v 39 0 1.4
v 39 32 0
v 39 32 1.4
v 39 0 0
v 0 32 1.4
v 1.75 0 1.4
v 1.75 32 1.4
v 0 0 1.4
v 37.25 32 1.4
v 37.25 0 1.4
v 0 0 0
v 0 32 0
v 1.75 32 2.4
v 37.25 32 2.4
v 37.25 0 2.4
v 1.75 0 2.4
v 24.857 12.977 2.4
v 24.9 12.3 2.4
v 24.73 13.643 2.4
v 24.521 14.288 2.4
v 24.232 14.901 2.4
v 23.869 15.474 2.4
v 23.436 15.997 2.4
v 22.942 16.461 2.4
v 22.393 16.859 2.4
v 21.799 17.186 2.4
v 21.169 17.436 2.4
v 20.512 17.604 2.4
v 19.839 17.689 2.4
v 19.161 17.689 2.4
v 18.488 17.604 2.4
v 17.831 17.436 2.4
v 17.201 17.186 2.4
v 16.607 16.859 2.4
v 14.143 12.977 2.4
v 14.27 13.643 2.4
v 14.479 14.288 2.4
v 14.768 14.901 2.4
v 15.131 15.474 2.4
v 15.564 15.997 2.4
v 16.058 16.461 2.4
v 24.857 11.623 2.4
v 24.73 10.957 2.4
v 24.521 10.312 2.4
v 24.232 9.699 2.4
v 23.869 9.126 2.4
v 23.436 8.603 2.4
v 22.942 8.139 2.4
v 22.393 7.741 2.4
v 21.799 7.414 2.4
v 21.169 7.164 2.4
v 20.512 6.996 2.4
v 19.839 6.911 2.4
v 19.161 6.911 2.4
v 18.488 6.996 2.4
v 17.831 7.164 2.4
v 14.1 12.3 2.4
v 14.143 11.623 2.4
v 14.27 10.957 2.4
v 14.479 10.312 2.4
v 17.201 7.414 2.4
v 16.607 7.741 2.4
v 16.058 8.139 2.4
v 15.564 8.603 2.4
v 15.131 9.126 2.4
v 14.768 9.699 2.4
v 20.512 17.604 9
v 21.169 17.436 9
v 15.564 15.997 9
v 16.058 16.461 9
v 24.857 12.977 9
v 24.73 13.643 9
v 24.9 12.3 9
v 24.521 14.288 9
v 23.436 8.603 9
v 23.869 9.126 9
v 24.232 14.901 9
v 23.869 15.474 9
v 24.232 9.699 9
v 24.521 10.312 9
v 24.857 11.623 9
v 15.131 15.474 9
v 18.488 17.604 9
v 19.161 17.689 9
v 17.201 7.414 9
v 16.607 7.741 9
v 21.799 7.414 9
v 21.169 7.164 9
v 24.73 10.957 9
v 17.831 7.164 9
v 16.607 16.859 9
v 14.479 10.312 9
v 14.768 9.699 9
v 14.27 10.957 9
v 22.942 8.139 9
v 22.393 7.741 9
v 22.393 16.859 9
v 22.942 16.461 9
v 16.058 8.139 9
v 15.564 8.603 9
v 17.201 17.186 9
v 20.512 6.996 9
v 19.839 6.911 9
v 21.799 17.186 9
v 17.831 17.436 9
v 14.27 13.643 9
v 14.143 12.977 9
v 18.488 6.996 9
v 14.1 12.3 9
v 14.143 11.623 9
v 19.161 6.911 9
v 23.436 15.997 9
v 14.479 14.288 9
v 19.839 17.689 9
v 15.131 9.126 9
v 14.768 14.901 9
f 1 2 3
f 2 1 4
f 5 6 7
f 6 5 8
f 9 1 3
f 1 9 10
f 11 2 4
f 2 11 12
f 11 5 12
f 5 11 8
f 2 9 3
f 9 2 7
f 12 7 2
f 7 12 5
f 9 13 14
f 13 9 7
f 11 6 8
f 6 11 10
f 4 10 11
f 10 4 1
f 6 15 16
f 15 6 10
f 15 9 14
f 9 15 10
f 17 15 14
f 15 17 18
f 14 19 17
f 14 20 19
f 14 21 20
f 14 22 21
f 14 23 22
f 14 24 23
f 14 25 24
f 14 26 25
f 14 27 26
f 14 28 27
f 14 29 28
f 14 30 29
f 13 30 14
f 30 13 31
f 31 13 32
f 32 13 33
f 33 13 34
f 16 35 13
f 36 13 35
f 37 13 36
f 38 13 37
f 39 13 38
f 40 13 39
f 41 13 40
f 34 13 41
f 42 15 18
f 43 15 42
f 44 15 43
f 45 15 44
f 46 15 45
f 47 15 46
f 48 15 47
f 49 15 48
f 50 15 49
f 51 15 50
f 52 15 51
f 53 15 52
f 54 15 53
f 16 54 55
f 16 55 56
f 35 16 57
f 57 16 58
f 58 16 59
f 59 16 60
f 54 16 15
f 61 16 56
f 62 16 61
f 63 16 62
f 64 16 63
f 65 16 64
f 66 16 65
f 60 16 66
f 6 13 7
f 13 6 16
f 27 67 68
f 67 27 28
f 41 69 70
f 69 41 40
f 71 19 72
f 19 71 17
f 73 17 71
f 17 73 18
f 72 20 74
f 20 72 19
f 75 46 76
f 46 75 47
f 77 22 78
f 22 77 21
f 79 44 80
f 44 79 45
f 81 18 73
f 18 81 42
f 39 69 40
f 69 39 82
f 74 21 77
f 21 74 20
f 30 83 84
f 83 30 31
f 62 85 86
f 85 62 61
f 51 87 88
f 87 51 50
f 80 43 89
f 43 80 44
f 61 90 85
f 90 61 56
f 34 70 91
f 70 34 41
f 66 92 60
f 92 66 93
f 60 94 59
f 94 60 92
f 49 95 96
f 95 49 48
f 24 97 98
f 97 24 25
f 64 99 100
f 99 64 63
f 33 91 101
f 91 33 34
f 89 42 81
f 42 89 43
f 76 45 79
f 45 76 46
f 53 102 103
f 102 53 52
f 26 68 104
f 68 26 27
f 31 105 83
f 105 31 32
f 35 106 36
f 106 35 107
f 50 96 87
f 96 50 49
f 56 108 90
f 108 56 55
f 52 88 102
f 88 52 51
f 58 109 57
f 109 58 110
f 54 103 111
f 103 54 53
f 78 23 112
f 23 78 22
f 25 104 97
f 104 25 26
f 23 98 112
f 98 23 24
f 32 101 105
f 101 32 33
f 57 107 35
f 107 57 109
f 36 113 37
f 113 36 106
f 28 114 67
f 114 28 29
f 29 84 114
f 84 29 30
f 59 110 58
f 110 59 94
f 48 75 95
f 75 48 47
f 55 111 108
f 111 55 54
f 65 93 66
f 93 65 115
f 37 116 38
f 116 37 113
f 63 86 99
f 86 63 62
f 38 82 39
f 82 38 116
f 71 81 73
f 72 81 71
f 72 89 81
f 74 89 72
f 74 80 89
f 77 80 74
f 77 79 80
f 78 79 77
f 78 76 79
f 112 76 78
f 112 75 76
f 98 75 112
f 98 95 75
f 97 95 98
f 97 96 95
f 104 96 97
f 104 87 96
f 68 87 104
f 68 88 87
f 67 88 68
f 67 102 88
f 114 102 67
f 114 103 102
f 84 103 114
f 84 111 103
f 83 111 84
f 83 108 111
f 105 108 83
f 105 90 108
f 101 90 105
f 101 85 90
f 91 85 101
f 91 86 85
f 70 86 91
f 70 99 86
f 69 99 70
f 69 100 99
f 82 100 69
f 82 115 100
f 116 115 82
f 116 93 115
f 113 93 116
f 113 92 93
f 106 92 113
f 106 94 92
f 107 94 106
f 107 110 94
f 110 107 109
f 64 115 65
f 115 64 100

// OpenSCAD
//import("WhammyBarJointv2.stl");

//PARAMS//

//Back plate (bit with just plate and cylinder

bp_x1 = 39; //full length
bp_x2 = 35.5; //length without thin bits on end
bp_y = 32; //width

//heights are of the whole piece at given point
bp_h1 = 1.4; //thinnest part on edges
bp_h2 = 2.4; //most of the piece
bp_h3 = 3; //little raised circular bit before the cylinder
bp_h4 = 9.3; // protruding cylinder


bp_od1 = 9; //radius of little circle bit
bp_od2 = 6; //outer radius protruding cylinder
bp_id = 3; // inner radius of through hole
bp_hole_x = bp_x1/2;
bp_hole_y = 12.3;

//front plate (looks like the back plate with more bits on it)
fp_id1 = 6;
fp_od1 = 10.8;

fp_h1 = 9;

fp_screw_id = 1.9;
fp_screw_od = 4;


//front plate attachment thing, kinda looks like a koala

fpa_od1 = 13;
fpa_id1 = 8;

fpa_d1 = 24;
fpa_d2 = 38;
fpa_y1 = 16;

fpa_rect_x = 5.5;
fpa_rect_y = 3;

fpa_h1 = 2.54; //most of the plate
fpa_h2 = 7.4; //cylinder protrusion

fpa_slot_w = 2.4;
fpa_slot_r = 16;

//spring holder (arm thingy, need two of them)
//pain in the ass to measure, at least they are the same

sh_id = 9;
sh_od = 13;
sh_id2 = 2.54; //smaller hole

sh_h1 = 2.54; //thickness at circle bit
sh_h2 = 2.54; //thickness at other end

sh_htot = 3.8; // overall zmax-zmin, there's some overlap
sh_hoverlap = sh_h1 + sh_h2 - sh_htot;

sh_polygon = [[-3,0],[16,0],[17,-3.5],[16,-4.5],[9.5,-3.5],[8,-7.2],[2.5,-6]];

sh_x2 = 25.3 - sh_od/2;
sh_y2 = 4.5;

module back_plate() {
  difference(){
    union(){ 
      translate([0,0,bp_h2-bp_h1]){
      cube([bp_x1,bp_y,bp_h1]);
      translate([(bp_x1-bp_x2)/2,0,bp_h1-bp_h2])
        cube([bp_x2,bp_y,bp_h2]);
      }
      translate([bp_hole_x,bp_hole_y,0]){
        cylinder(h=bp_h3, d=bp_od1, $fn=50, center=false);
        cylinder(h=bp_h4, d=bp_od2, $fn=50, center=false);
      }
    }
    translate([bp_hole_x,bp_hole_y,0]){
      cylinder(h=bp_h4, d=bp_id, $fn=50, center=false);
    }
  }
}


module spring_holder() {
  difference(){
    union() {
      
      difference(){
        cylinder(sh_h1,d=sh_od,$fn=50);
        cylinder(sh_h1,d=sh_id,$fn=50);
      }
      translate([sh_od/2-3,sh_od/2,0])
      linear_extrude(sh_h1) {
        polygon(sh_polygon);
      }
    }
    translate([sh_x2,sh_y2,0])
    cylinder(h=sh_h1, d=sh_id2, $fn=50);
  }
}

module front_plate_attachment() {
  difference() {
    union() {
      hull() {
        cylinder(h=fpa_h1,d=fpa_d1);
        difference(){
          cylinder(h=fpa_h1,d=fpa_d2);
          translate([-50,-100,0])
            cube([100,100,100]);
          translate([-50,16,0])
            cube([100,100,100]);
        }
      }
      cylinder(h=fpa_h2,d=fpa_od1,$fn=50);
    }
    translate([(fpa_od1+fpa_rect_x)/2,0,0])
      cube([fpa_rect_x,fpa_rect_y,2*fpa_h1],center=true);
    translate([-(fpa_od1+fpa_rect_x)/2,0,0])
      cube([fpa_rect_x,fpa_rect_y,2*fpa_h1],center=true);
    rotate_extrude(angle=40, $fn=50)
      translate([fpa_slot_r,0,0])
          square([fpa_slot_w,2*fpa_h1],center=true);
    mirror([1,0,0])
      rotate_extrude(angle=40, $fn=50)
        translate([fpa_slot_r,0,0])
            square([fpa_slot_w,2*fpa_h1],center=true);
    cylinder(h=fpa_h2,d=fpa_id1,$fn=50);
  }
}

module front_plate() {
  cube([bp_x1,bp_y,bp_h1]);
  translate([(bp_x1-bp_x2)/2,0,0])
    cube([bp_x2,bp_y,bp_h2]);
  translate([bp_hole_x, bp_hole_y,0])
    cylinder(d=fp_od1,h=fp_h1,$fn=50);
}

//back_plate();
front_plate();
